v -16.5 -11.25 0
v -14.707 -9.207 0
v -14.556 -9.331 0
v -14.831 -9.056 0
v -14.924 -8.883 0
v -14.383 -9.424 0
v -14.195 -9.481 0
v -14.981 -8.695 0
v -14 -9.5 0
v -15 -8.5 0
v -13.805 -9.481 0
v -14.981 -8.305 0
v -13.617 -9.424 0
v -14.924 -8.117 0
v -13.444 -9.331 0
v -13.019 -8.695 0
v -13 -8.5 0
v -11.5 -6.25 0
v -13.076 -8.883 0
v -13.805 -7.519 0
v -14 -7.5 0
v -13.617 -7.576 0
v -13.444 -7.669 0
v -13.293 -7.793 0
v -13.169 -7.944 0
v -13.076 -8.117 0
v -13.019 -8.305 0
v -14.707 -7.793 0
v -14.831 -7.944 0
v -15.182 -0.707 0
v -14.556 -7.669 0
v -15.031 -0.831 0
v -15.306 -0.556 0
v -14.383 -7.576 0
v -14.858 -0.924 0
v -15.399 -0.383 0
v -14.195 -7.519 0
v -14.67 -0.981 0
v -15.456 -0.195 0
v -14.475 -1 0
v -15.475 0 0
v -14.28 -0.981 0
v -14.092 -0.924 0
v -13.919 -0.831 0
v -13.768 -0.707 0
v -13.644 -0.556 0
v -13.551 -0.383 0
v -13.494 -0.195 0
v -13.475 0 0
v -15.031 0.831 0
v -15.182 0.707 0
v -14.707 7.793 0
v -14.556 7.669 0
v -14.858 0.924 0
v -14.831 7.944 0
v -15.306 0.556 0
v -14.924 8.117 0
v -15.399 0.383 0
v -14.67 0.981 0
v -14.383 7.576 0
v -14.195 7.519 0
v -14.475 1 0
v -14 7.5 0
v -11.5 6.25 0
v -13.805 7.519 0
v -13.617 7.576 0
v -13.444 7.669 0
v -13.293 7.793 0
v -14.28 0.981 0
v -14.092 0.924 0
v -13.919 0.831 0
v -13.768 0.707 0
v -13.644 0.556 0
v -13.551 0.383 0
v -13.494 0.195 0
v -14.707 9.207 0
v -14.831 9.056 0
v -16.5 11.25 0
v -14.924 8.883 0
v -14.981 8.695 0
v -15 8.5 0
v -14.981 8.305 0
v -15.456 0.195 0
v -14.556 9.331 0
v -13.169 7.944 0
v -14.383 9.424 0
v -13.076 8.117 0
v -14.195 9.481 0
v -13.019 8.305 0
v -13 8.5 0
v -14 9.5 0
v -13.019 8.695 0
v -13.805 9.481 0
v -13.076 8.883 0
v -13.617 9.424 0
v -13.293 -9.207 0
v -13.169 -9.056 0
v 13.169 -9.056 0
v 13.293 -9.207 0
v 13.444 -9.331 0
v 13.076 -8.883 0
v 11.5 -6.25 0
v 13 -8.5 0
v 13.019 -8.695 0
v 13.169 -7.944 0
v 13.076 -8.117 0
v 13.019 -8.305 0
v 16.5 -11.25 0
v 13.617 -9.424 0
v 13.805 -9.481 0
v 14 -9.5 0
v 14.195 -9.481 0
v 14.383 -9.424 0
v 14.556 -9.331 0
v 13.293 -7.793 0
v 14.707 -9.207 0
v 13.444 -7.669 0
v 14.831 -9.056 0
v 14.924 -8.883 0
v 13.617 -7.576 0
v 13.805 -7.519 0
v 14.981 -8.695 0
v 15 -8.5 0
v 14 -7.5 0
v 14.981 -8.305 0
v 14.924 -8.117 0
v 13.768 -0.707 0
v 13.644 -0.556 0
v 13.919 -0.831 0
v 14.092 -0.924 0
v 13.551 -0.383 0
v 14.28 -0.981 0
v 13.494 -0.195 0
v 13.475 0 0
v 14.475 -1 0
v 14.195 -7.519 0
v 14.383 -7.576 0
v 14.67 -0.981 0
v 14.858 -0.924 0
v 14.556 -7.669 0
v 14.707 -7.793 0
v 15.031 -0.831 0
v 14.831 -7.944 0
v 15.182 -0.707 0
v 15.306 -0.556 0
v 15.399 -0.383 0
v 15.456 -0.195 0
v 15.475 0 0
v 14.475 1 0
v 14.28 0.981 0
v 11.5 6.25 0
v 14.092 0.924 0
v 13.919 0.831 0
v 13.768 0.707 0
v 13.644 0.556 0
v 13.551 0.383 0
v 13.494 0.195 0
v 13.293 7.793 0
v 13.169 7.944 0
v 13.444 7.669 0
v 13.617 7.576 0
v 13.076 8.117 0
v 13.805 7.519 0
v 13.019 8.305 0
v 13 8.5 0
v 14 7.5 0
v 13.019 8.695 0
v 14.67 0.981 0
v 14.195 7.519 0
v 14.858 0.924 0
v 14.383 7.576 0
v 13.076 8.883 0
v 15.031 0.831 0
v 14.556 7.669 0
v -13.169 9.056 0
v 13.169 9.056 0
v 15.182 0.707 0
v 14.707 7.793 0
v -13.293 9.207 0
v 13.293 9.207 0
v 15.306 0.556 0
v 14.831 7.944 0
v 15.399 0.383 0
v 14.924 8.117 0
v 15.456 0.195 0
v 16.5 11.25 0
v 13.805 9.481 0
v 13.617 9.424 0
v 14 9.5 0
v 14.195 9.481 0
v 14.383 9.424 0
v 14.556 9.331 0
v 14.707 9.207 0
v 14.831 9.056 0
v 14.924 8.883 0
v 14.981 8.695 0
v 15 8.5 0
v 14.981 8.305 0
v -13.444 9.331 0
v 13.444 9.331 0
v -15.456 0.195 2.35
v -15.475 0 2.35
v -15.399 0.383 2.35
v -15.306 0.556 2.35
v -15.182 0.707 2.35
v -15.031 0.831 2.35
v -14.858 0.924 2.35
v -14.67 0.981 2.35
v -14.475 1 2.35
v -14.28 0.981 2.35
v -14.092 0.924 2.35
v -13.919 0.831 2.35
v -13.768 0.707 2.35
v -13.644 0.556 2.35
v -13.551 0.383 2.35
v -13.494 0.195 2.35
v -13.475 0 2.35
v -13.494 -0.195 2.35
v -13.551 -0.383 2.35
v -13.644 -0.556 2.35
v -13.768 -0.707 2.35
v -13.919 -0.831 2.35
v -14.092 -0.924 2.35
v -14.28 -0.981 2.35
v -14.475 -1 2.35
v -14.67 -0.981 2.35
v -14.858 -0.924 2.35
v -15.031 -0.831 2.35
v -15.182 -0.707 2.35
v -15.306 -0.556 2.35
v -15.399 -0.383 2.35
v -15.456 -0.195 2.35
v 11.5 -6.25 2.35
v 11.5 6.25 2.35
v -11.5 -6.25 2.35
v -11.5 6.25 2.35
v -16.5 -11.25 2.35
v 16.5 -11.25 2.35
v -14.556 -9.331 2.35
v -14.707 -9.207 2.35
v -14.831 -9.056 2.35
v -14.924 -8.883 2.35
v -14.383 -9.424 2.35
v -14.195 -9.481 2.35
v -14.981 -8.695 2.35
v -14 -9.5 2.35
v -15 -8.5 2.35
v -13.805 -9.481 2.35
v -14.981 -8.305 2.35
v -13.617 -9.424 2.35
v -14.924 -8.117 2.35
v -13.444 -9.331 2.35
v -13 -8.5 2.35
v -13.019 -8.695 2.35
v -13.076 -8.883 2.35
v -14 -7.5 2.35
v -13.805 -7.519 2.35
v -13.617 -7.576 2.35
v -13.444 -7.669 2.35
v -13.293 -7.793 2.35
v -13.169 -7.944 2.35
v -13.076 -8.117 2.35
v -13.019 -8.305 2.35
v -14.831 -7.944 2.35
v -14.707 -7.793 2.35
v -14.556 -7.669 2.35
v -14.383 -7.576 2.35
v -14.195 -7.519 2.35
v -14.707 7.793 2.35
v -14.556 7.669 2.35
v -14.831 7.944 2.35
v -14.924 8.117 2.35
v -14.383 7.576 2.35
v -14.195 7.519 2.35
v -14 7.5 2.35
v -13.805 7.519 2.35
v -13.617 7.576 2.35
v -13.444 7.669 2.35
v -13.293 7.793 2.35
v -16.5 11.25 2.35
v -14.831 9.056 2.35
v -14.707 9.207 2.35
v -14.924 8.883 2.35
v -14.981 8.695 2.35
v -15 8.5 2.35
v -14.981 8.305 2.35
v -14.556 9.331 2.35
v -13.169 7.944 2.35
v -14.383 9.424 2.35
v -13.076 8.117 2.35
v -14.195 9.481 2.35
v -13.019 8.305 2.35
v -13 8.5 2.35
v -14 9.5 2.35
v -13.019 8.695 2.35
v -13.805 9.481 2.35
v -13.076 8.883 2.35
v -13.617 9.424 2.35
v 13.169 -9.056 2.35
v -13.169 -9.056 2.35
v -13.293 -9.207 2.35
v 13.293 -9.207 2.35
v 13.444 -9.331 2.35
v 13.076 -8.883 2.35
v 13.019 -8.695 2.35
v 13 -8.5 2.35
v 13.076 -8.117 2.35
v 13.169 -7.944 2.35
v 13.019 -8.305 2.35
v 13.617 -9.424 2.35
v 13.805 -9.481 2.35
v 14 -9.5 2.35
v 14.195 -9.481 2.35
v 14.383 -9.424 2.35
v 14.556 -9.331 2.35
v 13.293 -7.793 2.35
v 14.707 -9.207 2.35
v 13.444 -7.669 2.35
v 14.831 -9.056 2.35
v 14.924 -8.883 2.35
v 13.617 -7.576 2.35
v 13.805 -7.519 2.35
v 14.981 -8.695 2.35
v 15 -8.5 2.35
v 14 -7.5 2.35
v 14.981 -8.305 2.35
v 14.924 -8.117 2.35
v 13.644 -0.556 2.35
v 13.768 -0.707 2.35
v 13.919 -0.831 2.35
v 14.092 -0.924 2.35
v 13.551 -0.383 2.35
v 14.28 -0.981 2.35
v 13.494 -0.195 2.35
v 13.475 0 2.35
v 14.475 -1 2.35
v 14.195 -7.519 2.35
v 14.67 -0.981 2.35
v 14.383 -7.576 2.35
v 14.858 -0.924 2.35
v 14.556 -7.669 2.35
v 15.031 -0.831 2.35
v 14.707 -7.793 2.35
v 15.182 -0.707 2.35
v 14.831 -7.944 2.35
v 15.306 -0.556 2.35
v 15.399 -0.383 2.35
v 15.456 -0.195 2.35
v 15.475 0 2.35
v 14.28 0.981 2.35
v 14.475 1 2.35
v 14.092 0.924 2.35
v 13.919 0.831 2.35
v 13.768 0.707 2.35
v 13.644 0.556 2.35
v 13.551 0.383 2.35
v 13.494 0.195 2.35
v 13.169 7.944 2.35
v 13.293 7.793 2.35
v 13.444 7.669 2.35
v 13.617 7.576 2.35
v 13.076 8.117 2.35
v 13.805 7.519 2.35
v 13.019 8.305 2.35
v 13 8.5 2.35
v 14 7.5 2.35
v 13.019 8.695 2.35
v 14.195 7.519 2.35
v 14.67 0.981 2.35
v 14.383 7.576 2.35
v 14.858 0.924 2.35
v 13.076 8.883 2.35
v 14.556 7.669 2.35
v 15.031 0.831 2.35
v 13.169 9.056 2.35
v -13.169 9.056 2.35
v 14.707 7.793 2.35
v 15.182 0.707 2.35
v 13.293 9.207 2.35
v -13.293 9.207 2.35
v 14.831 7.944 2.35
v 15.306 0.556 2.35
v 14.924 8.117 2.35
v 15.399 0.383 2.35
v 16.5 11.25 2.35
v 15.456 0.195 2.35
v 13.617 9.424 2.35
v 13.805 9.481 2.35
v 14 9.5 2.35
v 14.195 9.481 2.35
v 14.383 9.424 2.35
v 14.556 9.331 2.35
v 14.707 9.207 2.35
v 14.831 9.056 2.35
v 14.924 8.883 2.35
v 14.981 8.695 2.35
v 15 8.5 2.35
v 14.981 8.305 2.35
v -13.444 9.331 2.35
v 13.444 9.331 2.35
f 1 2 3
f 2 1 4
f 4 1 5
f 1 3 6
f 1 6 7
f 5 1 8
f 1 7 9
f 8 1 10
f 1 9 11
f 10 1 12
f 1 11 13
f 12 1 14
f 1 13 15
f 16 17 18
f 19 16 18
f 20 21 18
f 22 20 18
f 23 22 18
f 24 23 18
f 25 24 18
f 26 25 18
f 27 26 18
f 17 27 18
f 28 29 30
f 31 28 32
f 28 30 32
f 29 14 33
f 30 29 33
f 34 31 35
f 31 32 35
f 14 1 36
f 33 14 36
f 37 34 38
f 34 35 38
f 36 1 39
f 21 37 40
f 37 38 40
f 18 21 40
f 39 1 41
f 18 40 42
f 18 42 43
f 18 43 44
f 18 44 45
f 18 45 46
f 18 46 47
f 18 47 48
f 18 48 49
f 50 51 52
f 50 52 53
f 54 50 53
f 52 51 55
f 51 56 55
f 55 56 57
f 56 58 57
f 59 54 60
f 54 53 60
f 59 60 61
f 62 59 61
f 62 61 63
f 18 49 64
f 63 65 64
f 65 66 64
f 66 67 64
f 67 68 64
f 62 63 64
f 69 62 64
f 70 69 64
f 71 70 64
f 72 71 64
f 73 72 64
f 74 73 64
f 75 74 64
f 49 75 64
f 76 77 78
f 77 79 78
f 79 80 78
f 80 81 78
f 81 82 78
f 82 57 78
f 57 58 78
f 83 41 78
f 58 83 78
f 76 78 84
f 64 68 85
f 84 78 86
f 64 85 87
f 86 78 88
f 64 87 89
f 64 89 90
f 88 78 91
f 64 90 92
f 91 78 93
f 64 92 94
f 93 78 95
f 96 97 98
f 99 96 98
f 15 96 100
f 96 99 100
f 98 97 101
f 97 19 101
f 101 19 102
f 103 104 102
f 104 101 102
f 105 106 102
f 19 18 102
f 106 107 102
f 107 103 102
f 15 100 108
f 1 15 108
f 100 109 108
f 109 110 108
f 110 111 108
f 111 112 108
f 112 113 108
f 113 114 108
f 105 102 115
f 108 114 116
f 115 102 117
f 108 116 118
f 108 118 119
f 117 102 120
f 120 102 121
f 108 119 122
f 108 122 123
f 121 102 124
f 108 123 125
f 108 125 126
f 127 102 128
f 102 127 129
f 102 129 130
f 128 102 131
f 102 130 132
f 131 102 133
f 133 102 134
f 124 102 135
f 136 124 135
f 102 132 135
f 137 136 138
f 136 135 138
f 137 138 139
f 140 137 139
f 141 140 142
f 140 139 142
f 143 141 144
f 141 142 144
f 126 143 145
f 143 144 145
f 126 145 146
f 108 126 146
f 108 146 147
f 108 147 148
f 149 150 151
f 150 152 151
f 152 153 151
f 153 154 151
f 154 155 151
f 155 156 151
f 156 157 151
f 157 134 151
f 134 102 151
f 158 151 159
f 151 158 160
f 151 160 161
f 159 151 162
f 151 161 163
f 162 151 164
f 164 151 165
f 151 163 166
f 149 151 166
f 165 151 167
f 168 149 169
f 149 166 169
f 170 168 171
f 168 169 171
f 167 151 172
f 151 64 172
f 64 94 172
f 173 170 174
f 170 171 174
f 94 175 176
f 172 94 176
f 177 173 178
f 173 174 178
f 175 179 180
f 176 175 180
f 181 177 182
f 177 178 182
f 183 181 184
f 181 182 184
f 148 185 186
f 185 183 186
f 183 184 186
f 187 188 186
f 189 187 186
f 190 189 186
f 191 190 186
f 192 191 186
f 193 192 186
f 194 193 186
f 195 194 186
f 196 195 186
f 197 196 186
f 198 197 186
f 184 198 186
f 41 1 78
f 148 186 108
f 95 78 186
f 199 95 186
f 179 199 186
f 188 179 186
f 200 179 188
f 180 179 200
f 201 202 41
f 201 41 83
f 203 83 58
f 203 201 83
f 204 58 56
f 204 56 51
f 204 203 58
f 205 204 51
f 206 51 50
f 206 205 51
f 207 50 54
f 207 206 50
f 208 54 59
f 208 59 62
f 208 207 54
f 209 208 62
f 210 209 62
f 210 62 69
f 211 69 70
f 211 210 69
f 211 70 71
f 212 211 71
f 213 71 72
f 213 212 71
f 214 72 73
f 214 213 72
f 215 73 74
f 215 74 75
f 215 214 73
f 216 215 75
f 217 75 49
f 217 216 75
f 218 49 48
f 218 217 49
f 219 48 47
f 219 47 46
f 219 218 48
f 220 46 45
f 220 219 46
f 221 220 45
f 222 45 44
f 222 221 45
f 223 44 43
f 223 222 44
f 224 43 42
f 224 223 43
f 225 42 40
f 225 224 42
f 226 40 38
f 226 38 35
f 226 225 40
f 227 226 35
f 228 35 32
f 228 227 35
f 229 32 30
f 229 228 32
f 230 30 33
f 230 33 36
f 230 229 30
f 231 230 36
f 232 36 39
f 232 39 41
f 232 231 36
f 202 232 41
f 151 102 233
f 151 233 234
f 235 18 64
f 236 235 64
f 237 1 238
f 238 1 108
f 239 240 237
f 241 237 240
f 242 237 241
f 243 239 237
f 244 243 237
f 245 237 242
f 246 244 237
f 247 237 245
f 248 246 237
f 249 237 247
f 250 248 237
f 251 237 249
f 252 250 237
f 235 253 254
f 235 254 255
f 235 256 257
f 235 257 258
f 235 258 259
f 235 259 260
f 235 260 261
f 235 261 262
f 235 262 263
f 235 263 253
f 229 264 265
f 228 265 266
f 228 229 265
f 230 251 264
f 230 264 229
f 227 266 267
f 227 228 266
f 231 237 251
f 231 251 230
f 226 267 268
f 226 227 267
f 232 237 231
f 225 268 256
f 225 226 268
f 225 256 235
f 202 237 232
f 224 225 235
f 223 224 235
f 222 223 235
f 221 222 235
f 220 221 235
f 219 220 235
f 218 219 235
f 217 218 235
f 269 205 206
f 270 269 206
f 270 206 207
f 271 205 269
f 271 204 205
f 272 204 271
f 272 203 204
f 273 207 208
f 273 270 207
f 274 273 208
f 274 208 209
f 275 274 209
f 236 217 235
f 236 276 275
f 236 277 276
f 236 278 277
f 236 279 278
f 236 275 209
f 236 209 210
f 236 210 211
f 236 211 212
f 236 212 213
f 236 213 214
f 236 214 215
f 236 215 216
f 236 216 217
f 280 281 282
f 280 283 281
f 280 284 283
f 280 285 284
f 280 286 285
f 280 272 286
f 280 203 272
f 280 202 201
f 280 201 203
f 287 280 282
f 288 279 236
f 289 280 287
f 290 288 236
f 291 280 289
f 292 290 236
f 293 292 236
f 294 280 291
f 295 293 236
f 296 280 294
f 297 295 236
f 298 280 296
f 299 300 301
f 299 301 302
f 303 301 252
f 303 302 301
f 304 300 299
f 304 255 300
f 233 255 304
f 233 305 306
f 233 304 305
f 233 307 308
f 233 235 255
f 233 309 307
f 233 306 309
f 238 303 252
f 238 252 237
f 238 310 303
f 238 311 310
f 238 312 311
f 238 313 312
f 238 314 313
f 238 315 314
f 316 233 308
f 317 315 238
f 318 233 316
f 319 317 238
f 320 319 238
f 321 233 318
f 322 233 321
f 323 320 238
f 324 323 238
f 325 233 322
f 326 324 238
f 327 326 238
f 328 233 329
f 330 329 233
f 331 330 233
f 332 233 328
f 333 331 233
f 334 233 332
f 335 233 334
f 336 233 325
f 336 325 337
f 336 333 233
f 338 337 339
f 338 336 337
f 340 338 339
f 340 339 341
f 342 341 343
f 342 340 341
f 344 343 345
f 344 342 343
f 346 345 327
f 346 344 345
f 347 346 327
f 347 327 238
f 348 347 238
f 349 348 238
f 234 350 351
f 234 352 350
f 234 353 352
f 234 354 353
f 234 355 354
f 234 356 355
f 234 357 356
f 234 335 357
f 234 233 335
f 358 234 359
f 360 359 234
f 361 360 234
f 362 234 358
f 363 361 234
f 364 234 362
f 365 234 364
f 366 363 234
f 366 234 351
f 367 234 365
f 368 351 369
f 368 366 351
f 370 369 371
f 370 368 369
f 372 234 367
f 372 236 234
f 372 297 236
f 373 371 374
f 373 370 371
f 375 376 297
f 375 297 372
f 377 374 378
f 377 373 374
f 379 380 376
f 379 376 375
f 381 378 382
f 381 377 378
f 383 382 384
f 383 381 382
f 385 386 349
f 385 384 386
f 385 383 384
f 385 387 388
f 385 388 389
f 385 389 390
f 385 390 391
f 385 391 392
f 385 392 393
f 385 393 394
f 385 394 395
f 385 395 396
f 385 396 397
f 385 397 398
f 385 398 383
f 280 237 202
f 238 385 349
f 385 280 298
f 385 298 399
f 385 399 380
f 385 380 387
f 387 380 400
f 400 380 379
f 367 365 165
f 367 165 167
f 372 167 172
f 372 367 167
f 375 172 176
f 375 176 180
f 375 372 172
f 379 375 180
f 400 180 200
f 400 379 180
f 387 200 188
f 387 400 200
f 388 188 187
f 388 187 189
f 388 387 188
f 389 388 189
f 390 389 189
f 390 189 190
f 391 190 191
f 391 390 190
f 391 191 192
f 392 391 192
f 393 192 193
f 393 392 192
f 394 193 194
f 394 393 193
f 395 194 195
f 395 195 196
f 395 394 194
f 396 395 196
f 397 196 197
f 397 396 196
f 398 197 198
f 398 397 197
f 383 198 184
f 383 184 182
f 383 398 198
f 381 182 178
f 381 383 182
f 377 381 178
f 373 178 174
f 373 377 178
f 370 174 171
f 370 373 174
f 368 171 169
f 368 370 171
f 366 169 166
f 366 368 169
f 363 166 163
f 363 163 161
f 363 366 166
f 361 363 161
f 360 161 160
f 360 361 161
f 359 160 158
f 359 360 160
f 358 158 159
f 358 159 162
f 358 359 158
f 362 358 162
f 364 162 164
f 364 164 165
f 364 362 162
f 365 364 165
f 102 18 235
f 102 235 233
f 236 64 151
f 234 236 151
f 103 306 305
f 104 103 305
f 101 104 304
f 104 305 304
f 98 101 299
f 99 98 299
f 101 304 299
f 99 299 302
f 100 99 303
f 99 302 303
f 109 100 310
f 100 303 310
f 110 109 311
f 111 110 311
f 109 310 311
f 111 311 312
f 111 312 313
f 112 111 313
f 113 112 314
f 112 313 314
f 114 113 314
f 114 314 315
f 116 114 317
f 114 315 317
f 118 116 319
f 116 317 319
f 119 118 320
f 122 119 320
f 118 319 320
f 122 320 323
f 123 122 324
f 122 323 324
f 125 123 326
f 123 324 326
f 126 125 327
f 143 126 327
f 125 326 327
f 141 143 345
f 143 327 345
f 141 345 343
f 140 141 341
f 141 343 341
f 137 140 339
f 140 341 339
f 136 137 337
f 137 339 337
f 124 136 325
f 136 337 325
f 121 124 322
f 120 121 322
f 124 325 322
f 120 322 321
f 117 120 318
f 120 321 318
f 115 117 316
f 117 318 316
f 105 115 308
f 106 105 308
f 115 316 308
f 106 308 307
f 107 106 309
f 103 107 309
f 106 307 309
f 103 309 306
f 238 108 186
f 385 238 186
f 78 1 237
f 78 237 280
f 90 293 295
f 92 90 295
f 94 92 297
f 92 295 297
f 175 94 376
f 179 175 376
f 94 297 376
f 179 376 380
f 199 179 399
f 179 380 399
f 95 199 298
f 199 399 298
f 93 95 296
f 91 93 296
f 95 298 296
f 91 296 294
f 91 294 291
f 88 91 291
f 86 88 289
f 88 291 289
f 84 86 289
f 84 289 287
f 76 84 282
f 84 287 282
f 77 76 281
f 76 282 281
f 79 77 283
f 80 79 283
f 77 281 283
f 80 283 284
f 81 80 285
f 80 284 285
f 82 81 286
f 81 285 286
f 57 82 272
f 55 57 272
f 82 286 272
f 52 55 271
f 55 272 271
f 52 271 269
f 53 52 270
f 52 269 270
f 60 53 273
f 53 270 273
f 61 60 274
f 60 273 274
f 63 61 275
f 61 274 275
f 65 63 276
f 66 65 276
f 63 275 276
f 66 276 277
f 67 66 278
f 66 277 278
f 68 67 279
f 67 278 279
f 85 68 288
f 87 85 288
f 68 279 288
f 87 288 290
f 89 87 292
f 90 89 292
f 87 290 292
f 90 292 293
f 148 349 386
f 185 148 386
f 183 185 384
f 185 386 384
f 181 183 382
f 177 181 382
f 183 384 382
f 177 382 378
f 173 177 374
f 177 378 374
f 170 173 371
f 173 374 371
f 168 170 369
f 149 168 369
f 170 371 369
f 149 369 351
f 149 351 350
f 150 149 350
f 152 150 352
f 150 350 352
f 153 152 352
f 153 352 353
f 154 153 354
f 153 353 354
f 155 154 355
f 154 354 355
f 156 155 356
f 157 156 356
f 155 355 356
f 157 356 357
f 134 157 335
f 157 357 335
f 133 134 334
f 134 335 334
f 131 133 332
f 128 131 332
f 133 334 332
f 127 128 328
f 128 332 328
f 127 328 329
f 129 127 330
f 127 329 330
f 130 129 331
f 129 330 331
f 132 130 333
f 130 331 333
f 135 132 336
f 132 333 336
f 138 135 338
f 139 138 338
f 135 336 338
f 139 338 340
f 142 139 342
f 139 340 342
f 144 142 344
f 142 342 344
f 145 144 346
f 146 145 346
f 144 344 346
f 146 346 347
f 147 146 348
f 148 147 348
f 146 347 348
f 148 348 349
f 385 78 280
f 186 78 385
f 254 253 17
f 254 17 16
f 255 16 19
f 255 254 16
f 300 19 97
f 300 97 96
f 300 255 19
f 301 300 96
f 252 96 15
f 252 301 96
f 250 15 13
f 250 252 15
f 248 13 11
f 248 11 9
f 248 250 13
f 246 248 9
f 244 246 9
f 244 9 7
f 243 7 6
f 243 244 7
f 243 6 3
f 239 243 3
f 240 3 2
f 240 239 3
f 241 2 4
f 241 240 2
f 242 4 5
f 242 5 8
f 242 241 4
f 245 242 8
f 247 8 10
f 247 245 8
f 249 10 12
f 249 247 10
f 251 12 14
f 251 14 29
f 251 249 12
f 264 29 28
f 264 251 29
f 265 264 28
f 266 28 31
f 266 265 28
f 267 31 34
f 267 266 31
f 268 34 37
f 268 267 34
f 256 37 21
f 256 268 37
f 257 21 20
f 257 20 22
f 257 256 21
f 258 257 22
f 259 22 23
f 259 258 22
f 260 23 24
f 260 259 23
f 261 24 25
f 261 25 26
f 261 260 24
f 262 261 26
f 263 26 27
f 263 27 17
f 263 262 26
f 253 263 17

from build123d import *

# Parameters (mm, degrees)
SCHIZZO1_W                   = 33
SCHIZZO1_H                   = 22.5
SCHIZZO1_W_2                 = 23
SCHIZZO1_H_2                 = 12.5
ESTRUSIONE_ESTRUSIONE1_DEPTH = 2.35
SCHIZZO2_R                   = 1
TAGLIO_ESTRUSIONE1_DEPTH     = 2.35
SPECCHIA2_COPY_1_SKETCH_R    = 1
SPECCHIA2_COPY_1_DEPTH       = 2.35
SCHIZZO3_R                   = 1
TAGLIO_ESTRUSIONE2_DEPTH     = 2.35


with BuildPart() as part:
    # Schizzo1 → Estrusione-Estrusione1 (new body)
    with BuildSketch(Plane.XY):
        Rectangle(SCHIZZO1_W, SCHIZZO1_H)
        Rectangle(SCHIZZO1_W_2, SCHIZZO1_H_2, mode=Mode.SUBTRACT)
    extrude(amount=ESTRUSIONE_ESTRUSIONE1_DEPTH)

    # Schizzo2 → Taglio-Estrusione1 (cut)
    with BuildSketch(Plane.XY.offset(2.35)):
        with Locations((-14, 8.5)):
            Circle(SCHIZZO2_R)
    taglio_estrusione1 = extrude(amount=-TAGLIO_ESTRUSIONE1_DEPTH, mode=Mode.SUBTRACT)

    # Specchia1: Taglio-Estrusione1 across plane
    add(taglio_estrusione1.mirror(Plane.ZX), mode=Mode.SUBTRACT)

    # Specchia2: Taglio-Estrusione1 across plane
    add(taglio_estrusione1.mirror(Plane(origin=(0, 0, 0), x_dir=(0, 0, 1), z_dir=(1, 0, 0))), mode=Mode.SUBTRACT)

    # Specchia2 copy 1 sketch → Specchia2 copy 1 (cut)
    with BuildSketch(Plane(origin=(0, 0, 2.35), x_dir=(-1, 0, 0), z_dir=(0, 0, 1))):
        with Locations((-14, 8.5)):
            Circle(SPECCHIA2_COPY_1_SKETCH_R)
    extrude(amount=-SPECCHIA2_COPY_1_DEPTH, mode=Mode.SUBTRACT)

    # Schizzo3 → Taglio-Estrusione2 (cut)
    with BuildSketch(Plane.XY.offset(2.35)):
        with Locations((14.475, 0)):
            Circle(SCHIZZO3_R)
    taglio_estrusione2 = extrude(amount=-TAGLIO_ESTRUSIONE2_DEPTH, mode=Mode.SUBTRACT)

    # Specchia3: Taglio-Estrusione2 across plane
    add(taglio_estrusione2.mirror(Plane(origin=(0, 0, 0), x_dir=(0, 0, 1), z_dir=(1, 0, 0))), mode=Mode.SUBTRACT)


solid = part.part
